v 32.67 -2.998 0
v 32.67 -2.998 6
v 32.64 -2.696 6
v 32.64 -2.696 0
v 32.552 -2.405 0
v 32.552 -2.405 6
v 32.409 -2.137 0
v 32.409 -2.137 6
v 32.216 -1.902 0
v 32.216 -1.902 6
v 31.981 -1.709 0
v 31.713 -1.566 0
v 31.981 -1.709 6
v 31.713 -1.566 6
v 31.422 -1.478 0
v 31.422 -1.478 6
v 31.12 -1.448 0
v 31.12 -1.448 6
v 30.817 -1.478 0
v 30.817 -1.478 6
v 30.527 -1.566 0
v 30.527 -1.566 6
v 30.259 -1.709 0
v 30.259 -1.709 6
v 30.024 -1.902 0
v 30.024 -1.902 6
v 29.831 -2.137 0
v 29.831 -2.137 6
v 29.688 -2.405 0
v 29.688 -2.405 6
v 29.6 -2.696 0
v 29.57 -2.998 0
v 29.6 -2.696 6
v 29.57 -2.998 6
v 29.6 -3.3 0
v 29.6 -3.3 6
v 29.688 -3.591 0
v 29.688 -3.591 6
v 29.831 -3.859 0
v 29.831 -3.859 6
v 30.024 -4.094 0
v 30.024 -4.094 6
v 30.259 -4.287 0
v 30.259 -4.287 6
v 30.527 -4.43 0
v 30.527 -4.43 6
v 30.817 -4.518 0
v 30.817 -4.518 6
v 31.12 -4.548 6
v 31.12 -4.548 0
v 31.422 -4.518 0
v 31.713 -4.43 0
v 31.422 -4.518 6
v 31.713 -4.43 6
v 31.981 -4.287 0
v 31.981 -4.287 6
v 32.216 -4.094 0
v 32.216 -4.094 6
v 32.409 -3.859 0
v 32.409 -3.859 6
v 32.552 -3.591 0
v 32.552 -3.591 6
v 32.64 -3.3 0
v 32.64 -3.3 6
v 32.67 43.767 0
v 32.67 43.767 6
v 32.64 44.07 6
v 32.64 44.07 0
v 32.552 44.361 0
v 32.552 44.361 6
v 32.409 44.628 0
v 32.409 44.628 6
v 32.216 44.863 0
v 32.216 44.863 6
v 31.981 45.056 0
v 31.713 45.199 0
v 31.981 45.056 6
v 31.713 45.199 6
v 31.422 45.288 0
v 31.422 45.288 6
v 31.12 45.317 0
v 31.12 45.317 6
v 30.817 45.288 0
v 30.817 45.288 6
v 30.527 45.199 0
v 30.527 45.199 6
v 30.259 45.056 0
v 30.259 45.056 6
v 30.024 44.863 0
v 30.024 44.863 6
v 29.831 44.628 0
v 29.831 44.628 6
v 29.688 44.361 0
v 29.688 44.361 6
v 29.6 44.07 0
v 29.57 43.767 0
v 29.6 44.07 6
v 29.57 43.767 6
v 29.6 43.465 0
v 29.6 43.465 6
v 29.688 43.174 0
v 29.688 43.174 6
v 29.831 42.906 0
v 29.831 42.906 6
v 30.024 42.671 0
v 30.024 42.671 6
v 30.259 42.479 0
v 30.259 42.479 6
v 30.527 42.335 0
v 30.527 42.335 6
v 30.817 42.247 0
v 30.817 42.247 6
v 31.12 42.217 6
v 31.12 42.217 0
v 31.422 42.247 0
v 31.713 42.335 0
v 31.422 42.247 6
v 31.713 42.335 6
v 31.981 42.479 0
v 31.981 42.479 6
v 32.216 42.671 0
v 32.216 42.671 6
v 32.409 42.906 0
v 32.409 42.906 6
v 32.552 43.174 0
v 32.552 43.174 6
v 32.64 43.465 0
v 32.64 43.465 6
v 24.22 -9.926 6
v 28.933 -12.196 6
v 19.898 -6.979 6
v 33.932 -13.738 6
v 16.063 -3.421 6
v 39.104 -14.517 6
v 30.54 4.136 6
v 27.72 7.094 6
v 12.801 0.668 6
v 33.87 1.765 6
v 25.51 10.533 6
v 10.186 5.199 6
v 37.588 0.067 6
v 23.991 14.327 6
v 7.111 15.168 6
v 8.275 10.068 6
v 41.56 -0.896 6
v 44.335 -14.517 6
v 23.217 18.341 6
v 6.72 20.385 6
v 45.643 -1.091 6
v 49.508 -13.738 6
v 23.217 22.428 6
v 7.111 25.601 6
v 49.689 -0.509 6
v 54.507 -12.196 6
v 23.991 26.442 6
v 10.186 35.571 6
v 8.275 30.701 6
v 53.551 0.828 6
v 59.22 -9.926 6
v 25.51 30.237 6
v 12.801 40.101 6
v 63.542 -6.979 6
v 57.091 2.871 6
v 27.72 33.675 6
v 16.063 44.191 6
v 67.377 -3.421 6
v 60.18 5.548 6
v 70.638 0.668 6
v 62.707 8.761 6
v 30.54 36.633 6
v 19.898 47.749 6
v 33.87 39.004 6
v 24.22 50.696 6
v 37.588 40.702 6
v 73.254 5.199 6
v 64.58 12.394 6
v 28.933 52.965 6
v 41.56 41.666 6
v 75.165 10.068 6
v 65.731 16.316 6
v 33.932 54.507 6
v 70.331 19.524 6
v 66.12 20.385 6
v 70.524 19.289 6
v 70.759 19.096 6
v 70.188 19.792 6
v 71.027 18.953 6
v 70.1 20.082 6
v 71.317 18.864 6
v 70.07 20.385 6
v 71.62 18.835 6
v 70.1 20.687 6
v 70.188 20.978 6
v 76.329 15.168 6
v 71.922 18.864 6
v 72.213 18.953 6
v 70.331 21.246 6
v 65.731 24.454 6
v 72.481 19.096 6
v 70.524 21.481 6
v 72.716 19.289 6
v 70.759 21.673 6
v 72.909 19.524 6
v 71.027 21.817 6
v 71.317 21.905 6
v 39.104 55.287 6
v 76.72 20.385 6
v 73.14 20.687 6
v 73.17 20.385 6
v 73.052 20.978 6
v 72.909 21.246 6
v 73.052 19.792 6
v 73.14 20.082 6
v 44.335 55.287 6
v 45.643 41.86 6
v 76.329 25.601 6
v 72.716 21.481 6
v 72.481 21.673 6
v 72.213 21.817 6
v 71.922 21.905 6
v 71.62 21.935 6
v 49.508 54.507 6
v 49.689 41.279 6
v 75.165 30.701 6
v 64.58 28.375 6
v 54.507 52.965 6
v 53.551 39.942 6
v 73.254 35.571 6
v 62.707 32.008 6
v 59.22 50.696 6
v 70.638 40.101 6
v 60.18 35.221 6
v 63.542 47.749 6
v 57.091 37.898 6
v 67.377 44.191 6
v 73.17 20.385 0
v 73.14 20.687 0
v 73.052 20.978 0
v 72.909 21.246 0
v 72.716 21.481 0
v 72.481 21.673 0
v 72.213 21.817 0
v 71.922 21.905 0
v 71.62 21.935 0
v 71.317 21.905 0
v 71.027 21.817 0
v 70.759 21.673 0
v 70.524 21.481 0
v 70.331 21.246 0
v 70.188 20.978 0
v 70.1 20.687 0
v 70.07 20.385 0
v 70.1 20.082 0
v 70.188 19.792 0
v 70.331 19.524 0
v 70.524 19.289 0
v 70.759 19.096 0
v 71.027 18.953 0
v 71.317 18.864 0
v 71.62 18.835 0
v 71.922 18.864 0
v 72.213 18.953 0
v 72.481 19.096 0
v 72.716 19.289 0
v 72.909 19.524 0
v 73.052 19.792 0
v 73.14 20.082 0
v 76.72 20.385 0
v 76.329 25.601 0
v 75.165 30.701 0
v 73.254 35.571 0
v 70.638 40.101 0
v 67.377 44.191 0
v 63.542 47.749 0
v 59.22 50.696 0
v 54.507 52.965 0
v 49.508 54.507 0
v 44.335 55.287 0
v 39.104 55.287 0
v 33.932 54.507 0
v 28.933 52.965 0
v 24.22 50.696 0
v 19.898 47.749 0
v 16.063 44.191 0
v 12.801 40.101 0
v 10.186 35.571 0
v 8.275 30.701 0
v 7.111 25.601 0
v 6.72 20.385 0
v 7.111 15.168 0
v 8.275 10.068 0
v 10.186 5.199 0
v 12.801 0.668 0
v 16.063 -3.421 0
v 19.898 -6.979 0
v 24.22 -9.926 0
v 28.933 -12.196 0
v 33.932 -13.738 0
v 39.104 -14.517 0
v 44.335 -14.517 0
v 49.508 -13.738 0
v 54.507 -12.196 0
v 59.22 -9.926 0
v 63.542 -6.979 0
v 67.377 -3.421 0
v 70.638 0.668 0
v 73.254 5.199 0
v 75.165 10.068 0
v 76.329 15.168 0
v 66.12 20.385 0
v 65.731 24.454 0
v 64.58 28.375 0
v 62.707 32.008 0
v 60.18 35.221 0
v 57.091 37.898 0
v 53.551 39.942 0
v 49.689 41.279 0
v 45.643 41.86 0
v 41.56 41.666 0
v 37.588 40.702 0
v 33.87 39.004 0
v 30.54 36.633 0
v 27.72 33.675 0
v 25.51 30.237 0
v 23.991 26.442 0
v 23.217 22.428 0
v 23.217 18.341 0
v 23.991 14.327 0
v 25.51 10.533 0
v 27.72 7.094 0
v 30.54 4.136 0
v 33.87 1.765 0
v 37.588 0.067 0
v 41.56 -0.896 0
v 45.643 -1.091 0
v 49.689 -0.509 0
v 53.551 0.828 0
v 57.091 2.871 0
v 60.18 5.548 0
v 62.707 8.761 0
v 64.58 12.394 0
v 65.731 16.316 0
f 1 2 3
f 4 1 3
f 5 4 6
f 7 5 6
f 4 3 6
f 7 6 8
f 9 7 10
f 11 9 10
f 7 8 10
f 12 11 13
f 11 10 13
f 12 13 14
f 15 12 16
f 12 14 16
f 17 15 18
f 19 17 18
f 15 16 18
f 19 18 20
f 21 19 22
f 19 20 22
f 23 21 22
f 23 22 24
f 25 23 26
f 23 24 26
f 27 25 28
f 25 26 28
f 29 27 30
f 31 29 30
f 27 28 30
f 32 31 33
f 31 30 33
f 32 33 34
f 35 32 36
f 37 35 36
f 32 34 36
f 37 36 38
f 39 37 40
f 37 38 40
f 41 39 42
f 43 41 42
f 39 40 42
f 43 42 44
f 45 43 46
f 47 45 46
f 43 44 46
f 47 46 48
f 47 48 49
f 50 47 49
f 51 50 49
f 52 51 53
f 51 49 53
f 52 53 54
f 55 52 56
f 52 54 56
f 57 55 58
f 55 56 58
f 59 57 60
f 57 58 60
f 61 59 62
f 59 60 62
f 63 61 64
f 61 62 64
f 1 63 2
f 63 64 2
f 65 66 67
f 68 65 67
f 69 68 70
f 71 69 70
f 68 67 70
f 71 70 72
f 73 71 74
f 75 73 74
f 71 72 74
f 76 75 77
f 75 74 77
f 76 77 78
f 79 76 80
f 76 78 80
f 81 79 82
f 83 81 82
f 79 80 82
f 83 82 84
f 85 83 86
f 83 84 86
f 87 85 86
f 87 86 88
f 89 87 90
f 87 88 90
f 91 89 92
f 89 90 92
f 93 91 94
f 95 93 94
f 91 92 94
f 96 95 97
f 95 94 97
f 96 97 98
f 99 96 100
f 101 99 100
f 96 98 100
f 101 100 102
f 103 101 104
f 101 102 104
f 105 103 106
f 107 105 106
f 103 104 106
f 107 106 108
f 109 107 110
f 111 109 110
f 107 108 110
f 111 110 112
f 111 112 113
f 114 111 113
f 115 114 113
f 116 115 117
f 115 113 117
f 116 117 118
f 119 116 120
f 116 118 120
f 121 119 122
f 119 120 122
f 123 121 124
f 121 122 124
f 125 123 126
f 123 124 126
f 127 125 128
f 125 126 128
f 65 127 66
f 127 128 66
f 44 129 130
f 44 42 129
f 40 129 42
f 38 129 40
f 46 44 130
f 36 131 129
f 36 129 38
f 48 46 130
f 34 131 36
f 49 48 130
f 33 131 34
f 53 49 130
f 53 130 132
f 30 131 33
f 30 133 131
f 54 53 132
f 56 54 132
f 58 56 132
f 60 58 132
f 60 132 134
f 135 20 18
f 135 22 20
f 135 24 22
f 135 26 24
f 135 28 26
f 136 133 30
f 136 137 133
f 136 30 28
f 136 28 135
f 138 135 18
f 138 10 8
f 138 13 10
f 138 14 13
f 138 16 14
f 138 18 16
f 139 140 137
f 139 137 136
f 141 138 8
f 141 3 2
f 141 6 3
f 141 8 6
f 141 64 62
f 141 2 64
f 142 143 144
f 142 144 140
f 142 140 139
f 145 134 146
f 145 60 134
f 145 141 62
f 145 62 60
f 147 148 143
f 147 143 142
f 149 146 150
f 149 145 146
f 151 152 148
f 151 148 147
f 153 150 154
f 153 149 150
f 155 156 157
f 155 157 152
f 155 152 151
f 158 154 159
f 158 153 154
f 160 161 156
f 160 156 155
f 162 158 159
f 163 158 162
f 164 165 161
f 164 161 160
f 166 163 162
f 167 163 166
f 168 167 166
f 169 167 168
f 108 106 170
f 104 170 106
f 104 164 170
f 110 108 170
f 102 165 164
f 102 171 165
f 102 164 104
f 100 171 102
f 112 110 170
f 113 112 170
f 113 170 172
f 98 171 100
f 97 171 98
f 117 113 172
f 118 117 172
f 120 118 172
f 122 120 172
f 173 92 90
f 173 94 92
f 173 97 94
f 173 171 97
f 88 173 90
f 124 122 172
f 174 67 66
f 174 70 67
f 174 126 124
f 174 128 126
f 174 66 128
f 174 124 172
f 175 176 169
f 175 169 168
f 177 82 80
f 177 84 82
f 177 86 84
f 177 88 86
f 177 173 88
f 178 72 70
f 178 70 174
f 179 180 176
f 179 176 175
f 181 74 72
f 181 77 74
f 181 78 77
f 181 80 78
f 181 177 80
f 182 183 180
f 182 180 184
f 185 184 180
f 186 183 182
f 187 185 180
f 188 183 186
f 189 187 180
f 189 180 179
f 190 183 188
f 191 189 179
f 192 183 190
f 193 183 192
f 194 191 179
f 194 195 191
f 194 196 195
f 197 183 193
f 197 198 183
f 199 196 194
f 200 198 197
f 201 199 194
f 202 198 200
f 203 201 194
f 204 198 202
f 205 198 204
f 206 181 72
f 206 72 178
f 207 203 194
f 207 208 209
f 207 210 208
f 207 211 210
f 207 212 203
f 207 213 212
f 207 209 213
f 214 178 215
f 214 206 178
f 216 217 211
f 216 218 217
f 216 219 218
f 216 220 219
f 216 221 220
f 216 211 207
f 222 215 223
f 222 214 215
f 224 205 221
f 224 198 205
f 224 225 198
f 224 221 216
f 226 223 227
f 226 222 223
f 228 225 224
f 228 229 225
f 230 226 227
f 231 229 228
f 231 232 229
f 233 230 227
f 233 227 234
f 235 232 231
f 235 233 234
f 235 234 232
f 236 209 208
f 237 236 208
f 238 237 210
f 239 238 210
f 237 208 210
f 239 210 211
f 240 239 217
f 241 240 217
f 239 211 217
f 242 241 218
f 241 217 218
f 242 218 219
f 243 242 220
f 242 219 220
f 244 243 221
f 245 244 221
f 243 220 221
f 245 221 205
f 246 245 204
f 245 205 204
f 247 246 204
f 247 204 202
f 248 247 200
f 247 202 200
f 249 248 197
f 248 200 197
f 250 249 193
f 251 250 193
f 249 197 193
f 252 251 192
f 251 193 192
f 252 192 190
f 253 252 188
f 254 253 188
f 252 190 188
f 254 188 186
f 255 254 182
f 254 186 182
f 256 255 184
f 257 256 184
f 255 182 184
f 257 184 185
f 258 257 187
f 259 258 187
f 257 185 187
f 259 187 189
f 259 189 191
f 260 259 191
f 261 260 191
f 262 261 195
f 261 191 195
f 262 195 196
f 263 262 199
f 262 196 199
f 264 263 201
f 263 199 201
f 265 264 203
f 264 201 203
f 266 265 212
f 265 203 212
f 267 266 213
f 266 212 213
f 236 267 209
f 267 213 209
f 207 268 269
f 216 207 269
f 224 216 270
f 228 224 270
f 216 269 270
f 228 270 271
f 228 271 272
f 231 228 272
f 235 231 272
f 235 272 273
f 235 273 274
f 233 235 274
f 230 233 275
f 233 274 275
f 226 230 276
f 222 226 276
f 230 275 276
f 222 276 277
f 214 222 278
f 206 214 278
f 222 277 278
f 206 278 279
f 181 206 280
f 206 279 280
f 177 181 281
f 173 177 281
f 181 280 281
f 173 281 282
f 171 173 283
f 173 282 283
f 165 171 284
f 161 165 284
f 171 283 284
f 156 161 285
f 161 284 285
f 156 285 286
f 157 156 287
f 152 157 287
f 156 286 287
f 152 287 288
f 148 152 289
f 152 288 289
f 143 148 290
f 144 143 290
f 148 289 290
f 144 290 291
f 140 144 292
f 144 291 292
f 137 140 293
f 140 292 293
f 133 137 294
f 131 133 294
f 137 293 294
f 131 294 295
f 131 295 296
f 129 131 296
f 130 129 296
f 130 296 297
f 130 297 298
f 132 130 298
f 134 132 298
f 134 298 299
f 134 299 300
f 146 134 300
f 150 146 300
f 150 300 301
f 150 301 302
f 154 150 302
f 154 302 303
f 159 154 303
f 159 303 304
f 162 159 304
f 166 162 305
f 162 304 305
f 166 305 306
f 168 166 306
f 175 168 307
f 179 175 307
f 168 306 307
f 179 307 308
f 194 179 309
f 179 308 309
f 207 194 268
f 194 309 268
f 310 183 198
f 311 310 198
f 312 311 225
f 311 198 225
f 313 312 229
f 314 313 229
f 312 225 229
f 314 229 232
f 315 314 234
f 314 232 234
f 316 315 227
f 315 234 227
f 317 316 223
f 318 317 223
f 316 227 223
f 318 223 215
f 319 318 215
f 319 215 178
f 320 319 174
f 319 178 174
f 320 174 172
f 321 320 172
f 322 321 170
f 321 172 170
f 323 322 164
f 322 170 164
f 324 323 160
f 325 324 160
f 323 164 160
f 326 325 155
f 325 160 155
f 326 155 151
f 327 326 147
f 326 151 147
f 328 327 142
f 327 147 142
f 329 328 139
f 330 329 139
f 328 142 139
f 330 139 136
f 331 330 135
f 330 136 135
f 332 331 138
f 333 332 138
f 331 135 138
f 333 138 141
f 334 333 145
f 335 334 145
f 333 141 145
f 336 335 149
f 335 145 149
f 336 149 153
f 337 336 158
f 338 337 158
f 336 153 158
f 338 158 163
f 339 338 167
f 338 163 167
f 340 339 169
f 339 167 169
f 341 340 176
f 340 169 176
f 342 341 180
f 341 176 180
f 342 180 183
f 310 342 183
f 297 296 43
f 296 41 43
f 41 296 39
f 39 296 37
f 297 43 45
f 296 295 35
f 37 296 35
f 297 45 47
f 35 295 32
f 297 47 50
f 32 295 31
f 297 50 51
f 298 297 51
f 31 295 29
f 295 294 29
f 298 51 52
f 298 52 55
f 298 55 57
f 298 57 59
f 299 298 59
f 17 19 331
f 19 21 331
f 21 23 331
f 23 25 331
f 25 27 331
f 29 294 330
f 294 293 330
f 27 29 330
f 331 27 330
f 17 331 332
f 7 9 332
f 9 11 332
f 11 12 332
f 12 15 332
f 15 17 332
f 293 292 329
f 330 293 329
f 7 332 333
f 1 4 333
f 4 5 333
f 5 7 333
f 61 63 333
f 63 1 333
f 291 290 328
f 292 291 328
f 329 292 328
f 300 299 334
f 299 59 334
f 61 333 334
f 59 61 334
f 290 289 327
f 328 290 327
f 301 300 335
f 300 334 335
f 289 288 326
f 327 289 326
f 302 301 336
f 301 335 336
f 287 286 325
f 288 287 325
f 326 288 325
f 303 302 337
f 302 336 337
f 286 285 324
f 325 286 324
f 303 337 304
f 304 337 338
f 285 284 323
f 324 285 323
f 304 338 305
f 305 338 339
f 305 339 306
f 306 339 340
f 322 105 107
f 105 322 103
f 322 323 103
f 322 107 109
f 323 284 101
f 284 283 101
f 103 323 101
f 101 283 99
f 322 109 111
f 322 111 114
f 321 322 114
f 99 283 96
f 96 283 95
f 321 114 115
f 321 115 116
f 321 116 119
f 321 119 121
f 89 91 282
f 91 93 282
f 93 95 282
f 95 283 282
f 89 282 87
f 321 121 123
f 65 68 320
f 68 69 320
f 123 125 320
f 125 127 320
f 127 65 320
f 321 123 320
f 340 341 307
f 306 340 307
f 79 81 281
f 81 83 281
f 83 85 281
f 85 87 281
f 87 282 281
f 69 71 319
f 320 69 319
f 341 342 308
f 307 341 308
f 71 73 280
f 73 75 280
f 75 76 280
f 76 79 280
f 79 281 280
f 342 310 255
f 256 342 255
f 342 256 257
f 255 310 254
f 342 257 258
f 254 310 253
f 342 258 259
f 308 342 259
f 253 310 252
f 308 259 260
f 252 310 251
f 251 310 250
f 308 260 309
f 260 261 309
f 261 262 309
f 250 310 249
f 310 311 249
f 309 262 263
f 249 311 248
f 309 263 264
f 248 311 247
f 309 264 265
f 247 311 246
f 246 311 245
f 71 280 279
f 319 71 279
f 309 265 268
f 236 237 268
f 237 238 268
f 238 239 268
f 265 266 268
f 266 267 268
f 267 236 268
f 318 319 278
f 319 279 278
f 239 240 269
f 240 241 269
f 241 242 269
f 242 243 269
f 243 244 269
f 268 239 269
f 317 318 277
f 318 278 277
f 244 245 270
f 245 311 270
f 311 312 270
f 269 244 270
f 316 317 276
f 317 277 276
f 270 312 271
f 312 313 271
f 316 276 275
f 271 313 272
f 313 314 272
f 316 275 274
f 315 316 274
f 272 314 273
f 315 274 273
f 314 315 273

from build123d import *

# Parameters (mm, degrees)
SZKIC1_R                    = 35
DODANIE_WYCI_GNI_CIE1_DEPTH = 6
SZKIC3_R                    = 21.5
WYTNIJ_WYCI_GNI_CIE1_DEPTH  = 6
SZKIC4_R                    = 1.55
WYTNIJ_WYCI_GNI_CIE2_DEPTH  = 6


with BuildPart() as part:
    # Szkic1 → Dodanie-wyciągnięcie1 (new body)
    with BuildSketch(Plane.XY):
        with Locations((41.719839871, 20.384670663)):
            Circle(SZKIC1_R)
    extrude(amount=DODANIE_WYCI_GNI_CIE1_DEPTH)

    # Szkic3 → Wytnij-wyciągnięcie1 (cut)
    with BuildSketch(Plane.XY.offset(6)):
        with Locations((44.619839871, 20.384670663)):
            Circle(SZKIC3_R)
    extrude(amount=-WYTNIJ_WYCI_GNI_CIE1_DEPTH, mode=Mode.SUBTRACT)

    # Szkic4 → Wytnij-wyciągnięcie2 (cut)
    with BuildSketch(Plane.XY.offset(6)):
        with Locations((31.119839871, -2.99801524)):
            Circle(SZKIC4_R)
        with Locations((71.619839871, 20.384670663)):
            Circle(SZKIC4_R)
        with Locations((31.119839871, 43.767356565)):
            Circle(SZKIC4_R)
    extrude(amount=-WYTNIJ_WYCI_GNI_CIE2_DEPTH, mode=Mode.SUBTRACT)


solid = part.part
